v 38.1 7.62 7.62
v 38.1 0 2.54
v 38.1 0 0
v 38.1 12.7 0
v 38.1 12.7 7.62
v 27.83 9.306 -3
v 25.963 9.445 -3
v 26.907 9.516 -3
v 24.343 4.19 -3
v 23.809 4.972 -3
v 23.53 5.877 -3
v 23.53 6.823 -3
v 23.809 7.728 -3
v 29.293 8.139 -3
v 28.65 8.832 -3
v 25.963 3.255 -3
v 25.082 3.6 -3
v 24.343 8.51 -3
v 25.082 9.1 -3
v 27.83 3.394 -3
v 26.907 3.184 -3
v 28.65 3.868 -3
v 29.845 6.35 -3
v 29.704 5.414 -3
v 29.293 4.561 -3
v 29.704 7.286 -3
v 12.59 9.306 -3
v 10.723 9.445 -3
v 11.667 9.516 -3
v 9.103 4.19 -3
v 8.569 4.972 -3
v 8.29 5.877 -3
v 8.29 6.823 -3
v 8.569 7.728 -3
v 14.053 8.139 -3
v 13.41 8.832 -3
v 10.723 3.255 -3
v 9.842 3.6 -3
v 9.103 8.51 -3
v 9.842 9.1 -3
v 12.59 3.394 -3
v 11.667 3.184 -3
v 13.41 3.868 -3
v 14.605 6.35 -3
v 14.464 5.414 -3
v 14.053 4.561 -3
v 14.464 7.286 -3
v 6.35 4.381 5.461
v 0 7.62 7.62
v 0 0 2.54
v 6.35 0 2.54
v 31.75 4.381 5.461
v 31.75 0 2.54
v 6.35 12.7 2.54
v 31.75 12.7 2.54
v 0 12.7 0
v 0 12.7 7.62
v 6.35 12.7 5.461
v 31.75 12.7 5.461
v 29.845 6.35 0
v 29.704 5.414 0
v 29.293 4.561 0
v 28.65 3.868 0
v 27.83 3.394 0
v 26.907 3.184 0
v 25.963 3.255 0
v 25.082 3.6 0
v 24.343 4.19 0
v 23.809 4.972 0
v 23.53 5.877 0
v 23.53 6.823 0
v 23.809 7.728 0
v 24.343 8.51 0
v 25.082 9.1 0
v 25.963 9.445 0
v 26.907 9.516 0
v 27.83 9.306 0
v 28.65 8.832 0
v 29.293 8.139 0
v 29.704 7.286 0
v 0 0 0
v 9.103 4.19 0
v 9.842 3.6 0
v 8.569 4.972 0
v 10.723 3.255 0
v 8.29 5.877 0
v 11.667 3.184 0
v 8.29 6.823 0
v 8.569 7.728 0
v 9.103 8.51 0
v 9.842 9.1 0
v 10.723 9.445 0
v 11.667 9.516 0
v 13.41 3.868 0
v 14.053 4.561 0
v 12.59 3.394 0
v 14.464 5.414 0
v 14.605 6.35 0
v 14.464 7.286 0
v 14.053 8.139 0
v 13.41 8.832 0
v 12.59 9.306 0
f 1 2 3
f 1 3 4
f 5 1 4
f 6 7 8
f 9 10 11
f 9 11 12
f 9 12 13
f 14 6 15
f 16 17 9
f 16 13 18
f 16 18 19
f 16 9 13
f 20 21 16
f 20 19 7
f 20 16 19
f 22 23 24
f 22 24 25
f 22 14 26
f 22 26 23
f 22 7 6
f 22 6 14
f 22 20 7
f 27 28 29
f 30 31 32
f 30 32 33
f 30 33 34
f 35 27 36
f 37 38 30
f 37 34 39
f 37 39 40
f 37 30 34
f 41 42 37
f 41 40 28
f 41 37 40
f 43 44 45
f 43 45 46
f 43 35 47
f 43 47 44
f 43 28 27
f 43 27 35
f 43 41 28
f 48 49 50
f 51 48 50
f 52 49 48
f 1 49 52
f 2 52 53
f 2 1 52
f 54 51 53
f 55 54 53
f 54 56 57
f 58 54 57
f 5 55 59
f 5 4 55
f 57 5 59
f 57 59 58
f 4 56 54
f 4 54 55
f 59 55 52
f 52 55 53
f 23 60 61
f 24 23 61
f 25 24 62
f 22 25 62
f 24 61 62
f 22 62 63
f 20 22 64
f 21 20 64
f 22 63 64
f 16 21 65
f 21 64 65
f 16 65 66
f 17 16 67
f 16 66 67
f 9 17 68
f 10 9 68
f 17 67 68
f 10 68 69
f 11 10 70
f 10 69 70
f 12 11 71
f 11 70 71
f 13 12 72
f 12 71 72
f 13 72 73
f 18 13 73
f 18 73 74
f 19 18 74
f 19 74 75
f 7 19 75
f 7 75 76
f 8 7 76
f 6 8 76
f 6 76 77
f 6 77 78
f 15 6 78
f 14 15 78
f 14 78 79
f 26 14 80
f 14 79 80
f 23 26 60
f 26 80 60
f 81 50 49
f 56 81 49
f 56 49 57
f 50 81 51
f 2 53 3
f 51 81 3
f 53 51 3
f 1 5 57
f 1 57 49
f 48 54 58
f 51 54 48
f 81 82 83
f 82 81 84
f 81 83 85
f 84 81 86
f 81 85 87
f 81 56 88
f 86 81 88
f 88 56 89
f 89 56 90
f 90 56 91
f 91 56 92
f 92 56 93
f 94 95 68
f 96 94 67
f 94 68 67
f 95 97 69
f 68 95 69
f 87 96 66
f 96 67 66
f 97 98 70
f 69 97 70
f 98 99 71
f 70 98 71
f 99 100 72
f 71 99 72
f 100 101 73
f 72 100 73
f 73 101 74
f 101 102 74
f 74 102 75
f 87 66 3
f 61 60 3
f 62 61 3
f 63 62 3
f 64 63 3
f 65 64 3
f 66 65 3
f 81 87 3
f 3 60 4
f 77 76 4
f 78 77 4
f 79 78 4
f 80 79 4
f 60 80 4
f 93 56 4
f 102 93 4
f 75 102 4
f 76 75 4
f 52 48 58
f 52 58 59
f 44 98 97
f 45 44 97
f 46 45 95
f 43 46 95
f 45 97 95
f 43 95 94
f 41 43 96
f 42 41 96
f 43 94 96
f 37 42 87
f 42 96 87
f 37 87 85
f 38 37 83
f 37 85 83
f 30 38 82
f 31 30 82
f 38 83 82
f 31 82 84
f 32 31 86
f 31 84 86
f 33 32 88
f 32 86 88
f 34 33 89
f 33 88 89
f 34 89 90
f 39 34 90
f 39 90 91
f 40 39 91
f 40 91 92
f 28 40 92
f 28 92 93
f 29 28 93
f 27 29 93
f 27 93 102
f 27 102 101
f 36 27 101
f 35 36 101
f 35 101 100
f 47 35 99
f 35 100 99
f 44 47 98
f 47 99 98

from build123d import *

# Parameters (mm, degrees)
F0_W     = 38.1
F0_H     = 12.7
F1_DEPTH = 2.54
F3_DEPTH = 38.1
F4_W     = 25.4
F4_H     = 2.921
F5_DEPTH = 12.7
F6_R     = 3.175
F7_DEPTH = 3


with BuildPart() as f1:
    # F0 (on Top) → F1 (new body)
    with BuildSketch(Plane.XY):
        with Locations((19.05, 6.35)):
            Rectangle(F0_W, F0_H)
    extrude(amount=F1_DEPTH)

    # F2 (on face) → F3 (join)
    with BuildSketch(Plane.YZ.offset(38.1)):
        Polygon((0, 2.54), (12.7, 2.54), (12.7, 7.62), (7.62, 7.62), align=None)
    extrude(amount=-F3_DEPTH)

    # F4 (on face) → F5 (cut)
    with BuildSketch(Plane.XZ):
        with Locations((19.05, 4.0005)):
            Rectangle(F4_W, F4_H)
    extrude(amount=-F5_DEPTH, mode=Mode.SUBTRACT)

    # F6 (on face) → F7 (join)
    with BuildSketch(Plane(origin=(0, 0, 0), x_dir=(1, 0, 0), z_dir=(0, 0, -1))):
        with Locations((11.43, -6.35)):
            Circle(F6_R)
        with Locations((26.67, -6.35)):
            Circle(F6_R)
    extrude(amount=F7_DEPTH)


solid = f1.part
